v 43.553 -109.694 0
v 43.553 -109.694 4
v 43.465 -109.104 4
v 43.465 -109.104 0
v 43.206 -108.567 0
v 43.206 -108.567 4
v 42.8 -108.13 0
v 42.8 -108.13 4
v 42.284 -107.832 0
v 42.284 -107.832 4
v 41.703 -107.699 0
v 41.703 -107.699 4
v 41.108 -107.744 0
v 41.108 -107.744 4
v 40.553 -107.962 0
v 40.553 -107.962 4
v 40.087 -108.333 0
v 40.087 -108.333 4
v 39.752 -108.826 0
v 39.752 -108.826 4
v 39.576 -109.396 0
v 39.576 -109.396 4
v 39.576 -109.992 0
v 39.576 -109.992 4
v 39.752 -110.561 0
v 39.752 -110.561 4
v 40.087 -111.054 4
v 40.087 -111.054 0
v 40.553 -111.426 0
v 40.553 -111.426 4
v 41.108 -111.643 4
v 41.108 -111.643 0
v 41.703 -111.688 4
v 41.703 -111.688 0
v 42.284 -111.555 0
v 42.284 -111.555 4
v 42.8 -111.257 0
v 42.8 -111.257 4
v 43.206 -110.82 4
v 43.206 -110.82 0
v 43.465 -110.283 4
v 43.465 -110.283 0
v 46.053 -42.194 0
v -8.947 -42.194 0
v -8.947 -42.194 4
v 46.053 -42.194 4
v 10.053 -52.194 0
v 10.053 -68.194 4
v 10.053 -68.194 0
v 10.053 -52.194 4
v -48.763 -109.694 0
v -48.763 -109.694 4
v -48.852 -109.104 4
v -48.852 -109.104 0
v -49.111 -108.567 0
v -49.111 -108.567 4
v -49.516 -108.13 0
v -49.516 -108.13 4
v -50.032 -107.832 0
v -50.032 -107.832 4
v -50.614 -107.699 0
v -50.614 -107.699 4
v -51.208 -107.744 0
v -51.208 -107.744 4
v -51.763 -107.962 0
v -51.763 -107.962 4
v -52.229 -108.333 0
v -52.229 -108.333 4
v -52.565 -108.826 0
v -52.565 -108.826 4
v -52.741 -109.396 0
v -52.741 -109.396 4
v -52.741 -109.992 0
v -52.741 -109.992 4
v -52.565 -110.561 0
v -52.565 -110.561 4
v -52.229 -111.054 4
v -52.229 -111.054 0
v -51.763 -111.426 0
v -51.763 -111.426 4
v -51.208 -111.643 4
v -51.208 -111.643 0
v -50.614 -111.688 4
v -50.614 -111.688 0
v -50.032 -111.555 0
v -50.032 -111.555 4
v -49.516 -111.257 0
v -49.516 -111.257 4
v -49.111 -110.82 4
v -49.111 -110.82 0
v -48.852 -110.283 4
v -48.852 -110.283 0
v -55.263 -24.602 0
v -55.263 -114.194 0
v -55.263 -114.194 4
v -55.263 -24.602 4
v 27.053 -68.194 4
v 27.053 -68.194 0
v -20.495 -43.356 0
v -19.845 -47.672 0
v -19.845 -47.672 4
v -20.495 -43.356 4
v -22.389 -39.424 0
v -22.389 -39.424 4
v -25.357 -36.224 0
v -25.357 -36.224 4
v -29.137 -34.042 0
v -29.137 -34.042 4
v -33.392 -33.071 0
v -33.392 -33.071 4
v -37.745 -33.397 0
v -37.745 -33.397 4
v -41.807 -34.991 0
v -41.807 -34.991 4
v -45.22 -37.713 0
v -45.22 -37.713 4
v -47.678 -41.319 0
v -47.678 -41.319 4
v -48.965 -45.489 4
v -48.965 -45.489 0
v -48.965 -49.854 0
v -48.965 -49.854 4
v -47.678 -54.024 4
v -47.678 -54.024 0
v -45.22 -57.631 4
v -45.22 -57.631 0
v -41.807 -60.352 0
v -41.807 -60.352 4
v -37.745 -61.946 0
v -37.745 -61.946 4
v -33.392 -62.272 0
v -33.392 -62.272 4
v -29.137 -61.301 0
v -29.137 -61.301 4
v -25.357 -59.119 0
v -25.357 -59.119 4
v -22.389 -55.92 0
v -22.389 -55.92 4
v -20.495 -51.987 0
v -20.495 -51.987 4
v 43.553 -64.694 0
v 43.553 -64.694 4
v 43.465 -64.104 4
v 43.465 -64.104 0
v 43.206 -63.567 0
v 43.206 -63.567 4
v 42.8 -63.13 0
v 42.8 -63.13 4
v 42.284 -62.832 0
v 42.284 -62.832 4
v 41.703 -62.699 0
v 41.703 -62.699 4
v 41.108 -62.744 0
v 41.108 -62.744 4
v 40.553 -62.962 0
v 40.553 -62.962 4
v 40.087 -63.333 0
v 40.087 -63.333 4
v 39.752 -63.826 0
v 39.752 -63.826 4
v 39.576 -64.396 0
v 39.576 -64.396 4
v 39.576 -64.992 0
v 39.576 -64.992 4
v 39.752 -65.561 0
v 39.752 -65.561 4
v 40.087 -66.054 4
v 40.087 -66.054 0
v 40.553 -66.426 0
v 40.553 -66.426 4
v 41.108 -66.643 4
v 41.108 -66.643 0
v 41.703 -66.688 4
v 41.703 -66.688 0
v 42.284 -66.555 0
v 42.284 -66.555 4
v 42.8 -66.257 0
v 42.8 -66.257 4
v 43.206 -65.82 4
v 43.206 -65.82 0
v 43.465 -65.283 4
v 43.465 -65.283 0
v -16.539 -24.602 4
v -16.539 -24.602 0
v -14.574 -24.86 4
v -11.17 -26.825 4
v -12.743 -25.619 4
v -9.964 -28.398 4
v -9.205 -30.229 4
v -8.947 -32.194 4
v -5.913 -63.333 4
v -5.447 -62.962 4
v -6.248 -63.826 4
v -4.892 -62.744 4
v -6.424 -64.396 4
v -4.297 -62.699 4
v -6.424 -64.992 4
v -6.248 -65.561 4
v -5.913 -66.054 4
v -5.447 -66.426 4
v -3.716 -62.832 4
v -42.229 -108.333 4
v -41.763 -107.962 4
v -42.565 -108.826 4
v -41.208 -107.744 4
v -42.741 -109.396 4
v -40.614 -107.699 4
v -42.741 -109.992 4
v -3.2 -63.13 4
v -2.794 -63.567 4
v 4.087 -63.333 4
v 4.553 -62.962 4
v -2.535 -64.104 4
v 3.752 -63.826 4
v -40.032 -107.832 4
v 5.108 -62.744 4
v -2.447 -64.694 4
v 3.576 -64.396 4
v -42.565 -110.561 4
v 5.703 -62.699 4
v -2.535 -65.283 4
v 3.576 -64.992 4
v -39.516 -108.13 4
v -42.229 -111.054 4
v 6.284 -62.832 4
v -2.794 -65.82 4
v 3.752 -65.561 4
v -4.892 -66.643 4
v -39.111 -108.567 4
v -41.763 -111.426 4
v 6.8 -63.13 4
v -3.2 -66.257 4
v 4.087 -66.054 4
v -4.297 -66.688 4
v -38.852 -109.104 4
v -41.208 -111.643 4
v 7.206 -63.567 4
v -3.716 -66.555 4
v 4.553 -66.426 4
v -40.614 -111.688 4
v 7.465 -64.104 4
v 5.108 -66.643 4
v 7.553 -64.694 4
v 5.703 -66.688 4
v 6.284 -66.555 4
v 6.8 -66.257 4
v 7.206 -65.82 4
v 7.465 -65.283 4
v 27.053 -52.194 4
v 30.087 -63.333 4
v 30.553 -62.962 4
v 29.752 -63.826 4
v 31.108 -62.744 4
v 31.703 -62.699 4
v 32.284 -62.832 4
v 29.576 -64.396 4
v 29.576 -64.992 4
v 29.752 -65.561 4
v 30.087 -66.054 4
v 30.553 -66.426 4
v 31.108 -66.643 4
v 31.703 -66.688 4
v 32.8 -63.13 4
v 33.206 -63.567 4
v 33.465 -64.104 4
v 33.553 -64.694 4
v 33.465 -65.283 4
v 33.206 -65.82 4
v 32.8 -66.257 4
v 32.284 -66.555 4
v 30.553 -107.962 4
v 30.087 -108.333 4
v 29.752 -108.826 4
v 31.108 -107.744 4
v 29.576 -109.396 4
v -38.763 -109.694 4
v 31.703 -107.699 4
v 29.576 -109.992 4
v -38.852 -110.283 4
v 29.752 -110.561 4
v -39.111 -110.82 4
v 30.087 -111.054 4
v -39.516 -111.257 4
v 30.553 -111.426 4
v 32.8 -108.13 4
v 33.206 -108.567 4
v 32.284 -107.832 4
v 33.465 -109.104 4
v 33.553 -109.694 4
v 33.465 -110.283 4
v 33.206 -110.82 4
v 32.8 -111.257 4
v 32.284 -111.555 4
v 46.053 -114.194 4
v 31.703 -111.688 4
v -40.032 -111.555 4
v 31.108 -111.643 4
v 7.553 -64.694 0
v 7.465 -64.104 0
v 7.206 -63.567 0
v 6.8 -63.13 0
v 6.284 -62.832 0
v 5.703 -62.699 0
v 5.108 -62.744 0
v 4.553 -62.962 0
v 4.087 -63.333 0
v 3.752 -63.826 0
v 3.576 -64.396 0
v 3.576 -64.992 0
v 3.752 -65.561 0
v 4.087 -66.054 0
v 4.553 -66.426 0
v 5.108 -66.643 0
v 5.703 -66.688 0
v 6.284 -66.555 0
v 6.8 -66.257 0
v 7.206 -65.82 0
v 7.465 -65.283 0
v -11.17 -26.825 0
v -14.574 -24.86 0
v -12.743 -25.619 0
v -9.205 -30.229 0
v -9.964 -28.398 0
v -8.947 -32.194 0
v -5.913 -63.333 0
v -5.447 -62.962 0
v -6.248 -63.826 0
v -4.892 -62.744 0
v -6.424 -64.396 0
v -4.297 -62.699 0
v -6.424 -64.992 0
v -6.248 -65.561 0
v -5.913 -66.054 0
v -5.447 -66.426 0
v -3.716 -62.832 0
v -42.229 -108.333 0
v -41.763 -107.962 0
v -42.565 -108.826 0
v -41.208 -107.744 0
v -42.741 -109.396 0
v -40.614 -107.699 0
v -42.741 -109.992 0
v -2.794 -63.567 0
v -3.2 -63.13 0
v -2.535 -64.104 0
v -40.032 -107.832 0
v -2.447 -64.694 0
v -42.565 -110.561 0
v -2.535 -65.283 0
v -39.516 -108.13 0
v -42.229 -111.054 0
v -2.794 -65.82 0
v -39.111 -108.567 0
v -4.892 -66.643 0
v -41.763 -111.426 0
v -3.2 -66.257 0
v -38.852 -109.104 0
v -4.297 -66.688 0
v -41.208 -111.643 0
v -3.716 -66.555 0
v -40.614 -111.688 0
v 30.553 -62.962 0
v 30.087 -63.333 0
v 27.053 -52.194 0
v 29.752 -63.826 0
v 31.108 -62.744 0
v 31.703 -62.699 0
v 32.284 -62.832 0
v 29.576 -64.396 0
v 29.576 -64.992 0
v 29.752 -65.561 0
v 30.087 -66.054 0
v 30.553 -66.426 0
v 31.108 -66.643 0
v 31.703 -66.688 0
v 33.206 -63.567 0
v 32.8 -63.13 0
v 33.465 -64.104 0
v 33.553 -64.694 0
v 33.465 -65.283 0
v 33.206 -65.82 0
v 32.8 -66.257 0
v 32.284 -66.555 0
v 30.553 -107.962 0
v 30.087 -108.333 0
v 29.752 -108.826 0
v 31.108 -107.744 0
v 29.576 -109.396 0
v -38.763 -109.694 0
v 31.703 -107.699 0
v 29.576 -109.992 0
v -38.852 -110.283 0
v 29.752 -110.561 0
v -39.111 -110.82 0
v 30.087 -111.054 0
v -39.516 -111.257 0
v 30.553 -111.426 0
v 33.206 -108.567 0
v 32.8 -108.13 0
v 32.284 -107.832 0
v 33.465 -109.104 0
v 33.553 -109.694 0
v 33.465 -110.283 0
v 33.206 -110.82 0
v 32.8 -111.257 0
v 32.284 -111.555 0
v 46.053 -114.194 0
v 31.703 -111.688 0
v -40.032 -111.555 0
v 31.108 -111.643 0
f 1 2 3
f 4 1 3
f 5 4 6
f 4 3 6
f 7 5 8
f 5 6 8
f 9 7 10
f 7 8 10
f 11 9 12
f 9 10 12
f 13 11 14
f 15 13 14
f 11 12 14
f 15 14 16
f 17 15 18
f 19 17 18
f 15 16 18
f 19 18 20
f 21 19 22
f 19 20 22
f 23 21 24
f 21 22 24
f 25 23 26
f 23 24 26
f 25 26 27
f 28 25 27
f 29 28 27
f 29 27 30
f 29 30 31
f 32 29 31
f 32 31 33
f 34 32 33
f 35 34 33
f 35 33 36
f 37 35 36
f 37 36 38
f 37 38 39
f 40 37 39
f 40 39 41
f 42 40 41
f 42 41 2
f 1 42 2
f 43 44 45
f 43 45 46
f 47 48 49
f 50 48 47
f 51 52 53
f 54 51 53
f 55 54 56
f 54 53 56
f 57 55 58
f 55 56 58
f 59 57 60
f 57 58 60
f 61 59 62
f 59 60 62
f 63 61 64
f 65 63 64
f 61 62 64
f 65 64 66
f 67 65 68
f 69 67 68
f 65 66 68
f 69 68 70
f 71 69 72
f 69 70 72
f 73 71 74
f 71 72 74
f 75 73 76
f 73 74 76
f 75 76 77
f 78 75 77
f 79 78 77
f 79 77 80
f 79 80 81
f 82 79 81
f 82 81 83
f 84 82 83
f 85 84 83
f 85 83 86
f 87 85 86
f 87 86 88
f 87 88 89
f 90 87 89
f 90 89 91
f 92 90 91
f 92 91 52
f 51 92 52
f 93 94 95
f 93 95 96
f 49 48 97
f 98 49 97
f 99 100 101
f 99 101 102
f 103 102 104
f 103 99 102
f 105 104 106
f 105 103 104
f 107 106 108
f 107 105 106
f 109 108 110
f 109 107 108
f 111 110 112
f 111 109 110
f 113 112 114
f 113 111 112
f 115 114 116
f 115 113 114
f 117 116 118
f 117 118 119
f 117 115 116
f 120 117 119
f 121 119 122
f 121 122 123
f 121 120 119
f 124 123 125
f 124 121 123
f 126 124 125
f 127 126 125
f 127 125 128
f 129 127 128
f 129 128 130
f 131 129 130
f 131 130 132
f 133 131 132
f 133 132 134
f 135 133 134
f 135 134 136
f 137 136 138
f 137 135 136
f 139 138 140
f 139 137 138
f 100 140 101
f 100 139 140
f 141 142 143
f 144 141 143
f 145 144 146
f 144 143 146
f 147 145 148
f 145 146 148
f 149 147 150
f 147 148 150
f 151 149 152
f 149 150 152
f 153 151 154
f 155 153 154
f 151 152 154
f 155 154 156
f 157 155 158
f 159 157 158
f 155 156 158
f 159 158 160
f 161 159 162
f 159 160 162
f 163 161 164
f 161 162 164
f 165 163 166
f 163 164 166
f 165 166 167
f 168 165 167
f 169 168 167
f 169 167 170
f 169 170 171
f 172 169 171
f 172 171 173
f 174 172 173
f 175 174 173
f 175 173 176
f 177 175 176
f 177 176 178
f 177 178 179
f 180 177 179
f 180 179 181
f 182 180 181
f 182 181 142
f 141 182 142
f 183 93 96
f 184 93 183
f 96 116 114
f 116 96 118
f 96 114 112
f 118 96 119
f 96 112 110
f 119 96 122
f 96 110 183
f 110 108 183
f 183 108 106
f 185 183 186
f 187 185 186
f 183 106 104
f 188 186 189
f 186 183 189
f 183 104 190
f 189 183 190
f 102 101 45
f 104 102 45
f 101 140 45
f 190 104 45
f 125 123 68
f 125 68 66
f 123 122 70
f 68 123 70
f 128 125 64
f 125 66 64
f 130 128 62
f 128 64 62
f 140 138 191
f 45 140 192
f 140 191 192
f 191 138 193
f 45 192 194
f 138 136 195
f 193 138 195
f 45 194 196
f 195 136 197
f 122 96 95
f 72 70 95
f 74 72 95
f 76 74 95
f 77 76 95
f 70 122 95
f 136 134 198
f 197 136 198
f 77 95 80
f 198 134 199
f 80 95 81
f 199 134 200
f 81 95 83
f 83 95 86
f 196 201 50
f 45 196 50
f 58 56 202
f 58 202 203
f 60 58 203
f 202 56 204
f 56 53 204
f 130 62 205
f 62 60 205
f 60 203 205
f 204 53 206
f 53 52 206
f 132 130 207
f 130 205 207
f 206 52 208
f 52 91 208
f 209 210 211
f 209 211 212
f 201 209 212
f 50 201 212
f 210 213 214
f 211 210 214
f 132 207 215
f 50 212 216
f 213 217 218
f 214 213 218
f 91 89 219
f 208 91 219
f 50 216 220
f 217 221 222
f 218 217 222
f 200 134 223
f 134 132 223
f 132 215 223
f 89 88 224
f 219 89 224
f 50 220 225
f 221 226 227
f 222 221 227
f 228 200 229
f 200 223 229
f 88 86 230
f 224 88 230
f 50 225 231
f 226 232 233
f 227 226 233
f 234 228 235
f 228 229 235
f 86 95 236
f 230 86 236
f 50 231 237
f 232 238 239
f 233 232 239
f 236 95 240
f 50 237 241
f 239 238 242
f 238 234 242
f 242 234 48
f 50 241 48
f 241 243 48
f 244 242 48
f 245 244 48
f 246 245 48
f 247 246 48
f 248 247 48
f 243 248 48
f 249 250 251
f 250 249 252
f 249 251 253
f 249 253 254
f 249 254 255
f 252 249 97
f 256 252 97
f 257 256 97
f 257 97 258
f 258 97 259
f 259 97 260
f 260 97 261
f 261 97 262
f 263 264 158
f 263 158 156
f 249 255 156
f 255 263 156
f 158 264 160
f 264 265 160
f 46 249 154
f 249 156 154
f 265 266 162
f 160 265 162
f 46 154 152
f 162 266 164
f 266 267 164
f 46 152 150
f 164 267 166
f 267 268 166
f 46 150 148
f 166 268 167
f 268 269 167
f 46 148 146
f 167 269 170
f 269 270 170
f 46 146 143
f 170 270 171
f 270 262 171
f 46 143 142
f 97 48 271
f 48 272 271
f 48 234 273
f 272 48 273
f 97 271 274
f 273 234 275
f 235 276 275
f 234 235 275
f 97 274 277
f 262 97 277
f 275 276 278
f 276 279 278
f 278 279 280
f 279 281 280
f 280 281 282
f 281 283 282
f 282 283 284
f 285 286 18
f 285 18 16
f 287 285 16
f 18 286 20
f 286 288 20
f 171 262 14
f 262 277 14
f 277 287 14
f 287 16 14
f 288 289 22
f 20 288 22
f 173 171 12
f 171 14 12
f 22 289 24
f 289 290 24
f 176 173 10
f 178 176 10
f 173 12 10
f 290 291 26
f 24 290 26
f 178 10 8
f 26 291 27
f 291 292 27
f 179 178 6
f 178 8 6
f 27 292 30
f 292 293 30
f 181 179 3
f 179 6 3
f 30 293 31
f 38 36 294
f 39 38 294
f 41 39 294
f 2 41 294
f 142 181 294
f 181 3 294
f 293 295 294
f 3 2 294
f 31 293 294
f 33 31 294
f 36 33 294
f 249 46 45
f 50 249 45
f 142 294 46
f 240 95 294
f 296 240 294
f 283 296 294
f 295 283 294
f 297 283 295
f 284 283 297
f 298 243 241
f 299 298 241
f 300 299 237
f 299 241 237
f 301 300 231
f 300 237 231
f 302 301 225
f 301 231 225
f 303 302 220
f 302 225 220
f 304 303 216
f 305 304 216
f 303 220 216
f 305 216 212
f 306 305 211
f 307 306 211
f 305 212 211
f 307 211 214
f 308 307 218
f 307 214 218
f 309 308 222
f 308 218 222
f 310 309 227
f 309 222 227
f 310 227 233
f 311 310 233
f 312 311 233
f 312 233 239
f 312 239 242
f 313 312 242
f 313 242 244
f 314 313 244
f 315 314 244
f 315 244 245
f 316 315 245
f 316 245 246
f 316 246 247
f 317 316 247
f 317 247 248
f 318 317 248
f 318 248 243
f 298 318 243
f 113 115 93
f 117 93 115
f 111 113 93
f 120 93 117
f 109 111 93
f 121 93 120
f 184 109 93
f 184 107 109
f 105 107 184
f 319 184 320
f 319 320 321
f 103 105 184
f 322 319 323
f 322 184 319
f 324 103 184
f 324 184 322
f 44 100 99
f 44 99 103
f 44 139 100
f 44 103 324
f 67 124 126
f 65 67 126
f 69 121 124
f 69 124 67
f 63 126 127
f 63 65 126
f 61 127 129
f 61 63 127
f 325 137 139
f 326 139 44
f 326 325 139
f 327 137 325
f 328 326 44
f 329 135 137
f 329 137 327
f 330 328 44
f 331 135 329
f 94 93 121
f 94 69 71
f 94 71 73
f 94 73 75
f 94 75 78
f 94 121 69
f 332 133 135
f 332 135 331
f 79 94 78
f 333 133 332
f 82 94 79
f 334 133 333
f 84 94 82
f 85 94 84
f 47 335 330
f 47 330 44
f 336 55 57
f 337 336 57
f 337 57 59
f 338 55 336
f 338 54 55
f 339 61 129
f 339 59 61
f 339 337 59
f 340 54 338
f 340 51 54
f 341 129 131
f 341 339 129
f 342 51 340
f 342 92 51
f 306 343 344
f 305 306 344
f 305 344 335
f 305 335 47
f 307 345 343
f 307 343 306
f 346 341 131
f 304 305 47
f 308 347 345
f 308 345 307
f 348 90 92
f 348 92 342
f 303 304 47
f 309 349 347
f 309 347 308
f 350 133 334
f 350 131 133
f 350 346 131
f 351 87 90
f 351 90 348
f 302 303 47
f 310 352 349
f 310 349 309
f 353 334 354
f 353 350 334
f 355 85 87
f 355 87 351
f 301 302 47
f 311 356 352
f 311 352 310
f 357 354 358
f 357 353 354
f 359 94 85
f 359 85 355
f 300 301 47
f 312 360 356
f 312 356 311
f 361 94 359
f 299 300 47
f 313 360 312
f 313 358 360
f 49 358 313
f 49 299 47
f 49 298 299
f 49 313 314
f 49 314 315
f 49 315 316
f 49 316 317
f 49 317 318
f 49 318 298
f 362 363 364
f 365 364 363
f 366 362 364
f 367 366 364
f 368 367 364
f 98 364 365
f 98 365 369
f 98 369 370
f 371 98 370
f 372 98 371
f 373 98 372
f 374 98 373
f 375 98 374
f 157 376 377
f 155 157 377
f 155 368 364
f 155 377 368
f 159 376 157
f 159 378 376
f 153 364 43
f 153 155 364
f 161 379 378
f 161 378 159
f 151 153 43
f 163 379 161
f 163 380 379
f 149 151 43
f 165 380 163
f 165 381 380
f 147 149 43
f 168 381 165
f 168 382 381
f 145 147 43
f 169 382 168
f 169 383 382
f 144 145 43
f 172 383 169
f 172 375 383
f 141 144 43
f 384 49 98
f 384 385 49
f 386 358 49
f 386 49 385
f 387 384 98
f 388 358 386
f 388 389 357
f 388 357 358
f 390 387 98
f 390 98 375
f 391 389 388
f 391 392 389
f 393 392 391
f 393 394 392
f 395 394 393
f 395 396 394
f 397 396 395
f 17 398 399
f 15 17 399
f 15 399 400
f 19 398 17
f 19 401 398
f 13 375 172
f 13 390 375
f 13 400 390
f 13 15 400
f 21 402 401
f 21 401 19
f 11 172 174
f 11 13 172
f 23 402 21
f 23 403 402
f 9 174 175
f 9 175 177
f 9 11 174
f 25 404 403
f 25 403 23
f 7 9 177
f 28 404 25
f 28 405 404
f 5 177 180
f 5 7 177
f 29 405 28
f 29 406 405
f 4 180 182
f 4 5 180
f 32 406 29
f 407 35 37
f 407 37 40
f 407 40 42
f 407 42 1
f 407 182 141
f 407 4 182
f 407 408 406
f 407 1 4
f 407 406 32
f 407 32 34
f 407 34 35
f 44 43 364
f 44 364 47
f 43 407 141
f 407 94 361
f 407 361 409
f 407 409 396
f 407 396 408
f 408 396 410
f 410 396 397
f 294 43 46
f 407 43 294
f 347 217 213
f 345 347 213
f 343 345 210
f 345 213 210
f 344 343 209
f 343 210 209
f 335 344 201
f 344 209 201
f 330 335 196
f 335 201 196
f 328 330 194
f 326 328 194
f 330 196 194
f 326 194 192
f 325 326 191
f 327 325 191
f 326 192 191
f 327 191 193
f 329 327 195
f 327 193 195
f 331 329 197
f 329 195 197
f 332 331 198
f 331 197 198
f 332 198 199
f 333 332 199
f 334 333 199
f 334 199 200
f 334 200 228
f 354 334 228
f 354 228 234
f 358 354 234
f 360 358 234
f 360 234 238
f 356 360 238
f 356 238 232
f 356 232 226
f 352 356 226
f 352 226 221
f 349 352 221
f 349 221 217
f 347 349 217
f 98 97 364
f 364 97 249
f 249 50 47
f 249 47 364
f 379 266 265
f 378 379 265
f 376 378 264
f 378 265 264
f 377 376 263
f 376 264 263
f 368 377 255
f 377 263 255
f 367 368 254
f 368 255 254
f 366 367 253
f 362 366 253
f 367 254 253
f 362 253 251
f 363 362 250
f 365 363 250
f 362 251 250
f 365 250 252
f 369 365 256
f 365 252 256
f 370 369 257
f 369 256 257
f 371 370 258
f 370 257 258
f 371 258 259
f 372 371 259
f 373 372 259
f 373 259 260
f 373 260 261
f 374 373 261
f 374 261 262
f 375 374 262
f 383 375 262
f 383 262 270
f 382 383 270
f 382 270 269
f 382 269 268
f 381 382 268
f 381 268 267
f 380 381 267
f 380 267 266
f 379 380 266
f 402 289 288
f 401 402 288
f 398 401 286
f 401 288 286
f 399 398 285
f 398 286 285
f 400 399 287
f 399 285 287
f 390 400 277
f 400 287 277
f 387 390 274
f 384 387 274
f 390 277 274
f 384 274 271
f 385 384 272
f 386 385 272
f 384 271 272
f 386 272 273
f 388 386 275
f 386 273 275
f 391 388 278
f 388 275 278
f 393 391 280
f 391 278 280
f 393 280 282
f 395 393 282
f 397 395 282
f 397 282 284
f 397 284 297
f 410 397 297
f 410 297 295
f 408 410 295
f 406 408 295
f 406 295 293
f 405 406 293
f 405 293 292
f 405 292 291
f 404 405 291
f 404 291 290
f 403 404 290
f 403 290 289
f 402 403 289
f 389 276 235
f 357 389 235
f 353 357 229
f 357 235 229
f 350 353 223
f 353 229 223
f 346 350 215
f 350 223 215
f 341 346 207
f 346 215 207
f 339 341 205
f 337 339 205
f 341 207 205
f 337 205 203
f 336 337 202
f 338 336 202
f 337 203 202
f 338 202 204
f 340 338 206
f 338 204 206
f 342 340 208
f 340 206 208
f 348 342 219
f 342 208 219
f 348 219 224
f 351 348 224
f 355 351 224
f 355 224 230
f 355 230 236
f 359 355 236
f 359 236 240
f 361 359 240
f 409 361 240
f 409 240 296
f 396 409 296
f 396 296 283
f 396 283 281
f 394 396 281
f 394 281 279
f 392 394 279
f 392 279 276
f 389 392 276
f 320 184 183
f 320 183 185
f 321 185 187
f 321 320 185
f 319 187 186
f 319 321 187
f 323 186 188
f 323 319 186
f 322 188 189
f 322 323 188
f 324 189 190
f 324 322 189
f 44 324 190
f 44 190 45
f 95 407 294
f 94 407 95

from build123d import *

# Parameters (mm, degrees)
SKETCH1_R           = 14.641801201
BOSS_EXTRUDE1_DEPTH = 4
SKETCH2_R           = 2
CUT_EXTRUDE1_DEPTH  = 16
SKETCH3_W           = 17
SKETCH3_H           = 16
CUT_EXTRUDE2_DEPTH  = 7


with BuildPart() as part:
    # Sketch1 → Boss-Extrude1 (new body)
    with BuildSketch(Plane(origin=(0, 0, 0), x_dir=(-1, 0, 0), z_dir=(0, 0, 1))):
        with BuildLine():
            Line((8.946512726, 42.193608765), (-46.053487274, 42.193608765))
            Line((-46.053487274, 42.193608765), (-46.053487274, 114.193608765))
            Line((-46.053487274, 114.193608765), (55.263162893, 114.193608765))
            Line((55.263162893, 114.193608765), (55.263162893, 24.601563698))
            Line((55.263162893, 24.601563698), (16.538557793, 24.601563698))
            ThreePointArc((16.538557793, 24.601563698), (11.170171243, 26.825222215), (8.946512726, 32.193608765))
            Line((8.946512726, 32.193608765), (8.946512726, 42.193608765))
        make_face()
        with Locations(Location((34.486512726, 47.671563698, 0), (0, 0, 180))):
            Circle(SKETCH1_R, mode=Mode.SUBTRACT)
    extrude(amount=BOSS_EXTRUDE1_DEPTH)

    # Sketch2 → Cut-Extrude1 (cut)
    with BuildSketch(Plane.XY.offset(4)):
        with Locations((41.553487274, -109.693608765)):
            Circle(SKETCH2_R)
        with Locations((31.553487274, -109.693608765)):
            Circle(SKETCH2_R)
        with Locations((-50.763162893, -109.693608765)):
            Circle(SKETCH2_R)
        with Locations((-40.763162893, -109.693608765)):
            Circle(SKETCH2_R)
        with Locations((41.553487274, -64.693608765)):
            Circle(SKETCH2_R)
        with Locations((31.553487274, -64.693608765)):
            Circle(SKETCH2_R)
        with Locations((-4.446512726, -64.693608765)):
            Circle(SKETCH2_R)
        with Locations((5.553487274, -64.693608765)):
            Circle(SKETCH2_R)
    extrude(amount=-CUT_EXTRUDE1_DEPTH, mode=Mode.SUBTRACT)

    # Sketch3 → Cut-Extrude2 (cut)
    with BuildSketch(Plane.XY.offset(4)):
        with Locations((18.553487274, -60.193608765)):
            Rectangle(SKETCH3_W, SKETCH3_H)
    extrude(amount=-CUT_EXTRUDE2_DEPTH, mode=Mode.SUBTRACT)


solid = part.part
